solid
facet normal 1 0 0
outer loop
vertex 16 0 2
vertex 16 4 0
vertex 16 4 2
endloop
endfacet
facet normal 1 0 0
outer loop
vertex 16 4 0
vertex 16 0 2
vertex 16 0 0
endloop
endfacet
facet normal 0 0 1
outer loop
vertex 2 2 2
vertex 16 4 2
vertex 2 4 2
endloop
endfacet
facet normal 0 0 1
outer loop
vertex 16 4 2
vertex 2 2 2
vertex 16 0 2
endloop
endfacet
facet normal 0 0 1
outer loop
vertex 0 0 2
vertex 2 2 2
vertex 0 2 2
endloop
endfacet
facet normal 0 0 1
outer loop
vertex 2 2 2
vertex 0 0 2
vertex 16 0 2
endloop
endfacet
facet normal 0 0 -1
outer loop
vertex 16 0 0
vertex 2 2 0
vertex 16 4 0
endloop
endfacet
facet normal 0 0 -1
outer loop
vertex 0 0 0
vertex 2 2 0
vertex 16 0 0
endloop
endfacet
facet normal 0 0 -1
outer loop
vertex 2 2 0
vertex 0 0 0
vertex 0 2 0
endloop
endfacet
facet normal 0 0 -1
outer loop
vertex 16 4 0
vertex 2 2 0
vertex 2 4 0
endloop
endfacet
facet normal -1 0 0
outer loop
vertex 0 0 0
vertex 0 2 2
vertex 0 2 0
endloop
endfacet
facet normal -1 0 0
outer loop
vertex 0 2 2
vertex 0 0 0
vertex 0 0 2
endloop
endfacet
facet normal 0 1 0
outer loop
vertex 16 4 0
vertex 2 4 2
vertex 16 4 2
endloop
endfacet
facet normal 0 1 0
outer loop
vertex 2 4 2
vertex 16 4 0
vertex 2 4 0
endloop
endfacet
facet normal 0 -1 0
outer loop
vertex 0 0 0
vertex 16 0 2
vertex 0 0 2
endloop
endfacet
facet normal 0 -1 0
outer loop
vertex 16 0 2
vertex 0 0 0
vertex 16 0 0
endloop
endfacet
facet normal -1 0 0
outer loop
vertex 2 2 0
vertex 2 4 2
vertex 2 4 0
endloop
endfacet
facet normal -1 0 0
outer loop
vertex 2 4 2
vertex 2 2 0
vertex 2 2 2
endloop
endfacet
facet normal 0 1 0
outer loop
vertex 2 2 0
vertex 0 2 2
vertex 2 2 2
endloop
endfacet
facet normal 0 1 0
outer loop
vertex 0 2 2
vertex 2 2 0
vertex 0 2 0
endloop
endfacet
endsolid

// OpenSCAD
use <MCAD/boxes.scad>

BIG = [1024, 1024, 1024];

module boardPattern(size = [128, 64, 4], degree = 60, stick = [THICK, THICK, 32]) {
	intersection() {
		cube([size[0], size[1], stick[1]]);
		for (dx = [-1024: stick[2]: 1024]) {
			translate([dx, -cos(degree) * stick[1], -1])	rotate([0, 0, degree])	cube([1024, stick[0], stick[1]]);
			mirror([1, 0, 0])
			translate([dx, -cos(degree) * stick[1], -1])	rotate([0, 0, degree])	cube([1024, stick[0], stick[1]]);
		}
	}
}
module mark(name, height, size = 2) {
	linear_extrude(height, center = false)	text(name, size = size);
}
module hole(w, h, z) {
	translate([w / 2, h / 2, z / 2])		roundedBox(size=[w, h, z], radius = w / 4, sidesonly = true);
}
module ellipsis(w = 32, h = 16, z = 4) {
	translate([w / 2, h / 2, 0])
		resize([w, h, z])
			cylinder(1024, 1024, 1024);
}
module cornerHole(base, m, in, out, height) {
	delta = (out - in) / 2;
		translate([m,					m,					0])	ellipsis(in, in);
		translate([base[0] - m,	m,					0])	ellipsis(in, in);
		translate([base[0] - m,	base[1] - m,		0])	ellipsis(in, in);
		translate([m,					base[1] - m,		0])	ellipsis(in, in);

		translate([m - delta,					m - delta,					height])	ellipsis(out, out);
		translate([base[0] - m  - delta,	m - delta,					height])	ellipsis(out, out);
		translate([base[0] - m  - delta,	base[1] - m - delta,	height])	ellipsis(out, out);
		translate([m - delta,					base[1] - m - delta,	height])	ellipsis(out, out);
}
module lineBox(outter = [100, 100, 100], t = 2) {
	size = outter - [t*2, t*2, t*2];
	center = false;

	translate([t, t, t])	{
		
	// x
	translate([0, 0, 0])						rotate([0, 90, 0])		cylinder(h = size[0], r = t, center = center);
	translate([0, size[1], 0])			rotate([0, 90, 0])		cylinder(h = size[0], r = t, center = center);
	translate([0, size[1], size[2]])	rotate([0, 90, 0])		cylinder(h = size[0], r = t, center = center);
	translate([0, 0, size[2]])			rotate([0, 90, 0])		cylinder(h = size[0], r = t, center = center);

	// y
	translate([0, 0, 0])						rotate([270, 0, 0])		cylinder(h = size[1], r = t, center = center);
	translate([size[0], 0, 0])			rotate([270, 0, 0])		cylinder(h = size[1], r = t, center = center);
	translate([size[0], 0, size[2]])	rotate([270, 0, 0])		cylinder(h = size[1], r = t, center = center);
	translate([0, 0, size[2]])			rotate([270, 0, 0])		cylinder(h = size[1], r = t, center = center);

	// z
	translate([0, 0, 0])						rotate([0, 0, 0])		cylinder(h = size[2], r = t, center = center);
	translate([size[0], 0, 0])			rotate([0, 0, 0])		cylinder(h = size[2], r = t, center = center);
	translate([size[0], size[1], 0])	rotate([0, 0, 0])		cylinder(h = size[2], r = t, center = center);
	translate([0, size[1], 0])	rotate([0, 0, 0])				cylinder(h = size[2], r = t, center = center);
	}
}
module hide(show = 0) {
	if (show > 0) children();
	else scale([0, 0, 0])	children();
}

module t() {
	c = [0.5, 0.5, 0.5, 0.5];
	d = [0.5, 0.5, 0.0, 0.5];
	
	color(c)	difference() {
		cube([4, 16, 2]);
		translate([2, -2, -1])	cube([4, 4, 4]);
	}
	color(d)	translate([8, 0, 0])	cube([16, 4, 2]);
}

module test(b) {
	
	c = [0.5, 0.5, 0.5, 0.5];
	d = [0.5, 0.5, 0.0, 0.5];
	
	color(c)	difference() {
		cube(b);
		translate([-BIG[0]+b[1]/2, b[1]/2, -BIG[2] / 2])	cube(BIG);
		//translate([b[0]-b[1]/2, b[1]/2, -1])	cube([b[1], b[1], b[2]*2]);
	}
}
		//translate([-BIG[0]+16, 16, 0])	cube(BIG);
test([16, 4, 2]);
//cube(BIG);
